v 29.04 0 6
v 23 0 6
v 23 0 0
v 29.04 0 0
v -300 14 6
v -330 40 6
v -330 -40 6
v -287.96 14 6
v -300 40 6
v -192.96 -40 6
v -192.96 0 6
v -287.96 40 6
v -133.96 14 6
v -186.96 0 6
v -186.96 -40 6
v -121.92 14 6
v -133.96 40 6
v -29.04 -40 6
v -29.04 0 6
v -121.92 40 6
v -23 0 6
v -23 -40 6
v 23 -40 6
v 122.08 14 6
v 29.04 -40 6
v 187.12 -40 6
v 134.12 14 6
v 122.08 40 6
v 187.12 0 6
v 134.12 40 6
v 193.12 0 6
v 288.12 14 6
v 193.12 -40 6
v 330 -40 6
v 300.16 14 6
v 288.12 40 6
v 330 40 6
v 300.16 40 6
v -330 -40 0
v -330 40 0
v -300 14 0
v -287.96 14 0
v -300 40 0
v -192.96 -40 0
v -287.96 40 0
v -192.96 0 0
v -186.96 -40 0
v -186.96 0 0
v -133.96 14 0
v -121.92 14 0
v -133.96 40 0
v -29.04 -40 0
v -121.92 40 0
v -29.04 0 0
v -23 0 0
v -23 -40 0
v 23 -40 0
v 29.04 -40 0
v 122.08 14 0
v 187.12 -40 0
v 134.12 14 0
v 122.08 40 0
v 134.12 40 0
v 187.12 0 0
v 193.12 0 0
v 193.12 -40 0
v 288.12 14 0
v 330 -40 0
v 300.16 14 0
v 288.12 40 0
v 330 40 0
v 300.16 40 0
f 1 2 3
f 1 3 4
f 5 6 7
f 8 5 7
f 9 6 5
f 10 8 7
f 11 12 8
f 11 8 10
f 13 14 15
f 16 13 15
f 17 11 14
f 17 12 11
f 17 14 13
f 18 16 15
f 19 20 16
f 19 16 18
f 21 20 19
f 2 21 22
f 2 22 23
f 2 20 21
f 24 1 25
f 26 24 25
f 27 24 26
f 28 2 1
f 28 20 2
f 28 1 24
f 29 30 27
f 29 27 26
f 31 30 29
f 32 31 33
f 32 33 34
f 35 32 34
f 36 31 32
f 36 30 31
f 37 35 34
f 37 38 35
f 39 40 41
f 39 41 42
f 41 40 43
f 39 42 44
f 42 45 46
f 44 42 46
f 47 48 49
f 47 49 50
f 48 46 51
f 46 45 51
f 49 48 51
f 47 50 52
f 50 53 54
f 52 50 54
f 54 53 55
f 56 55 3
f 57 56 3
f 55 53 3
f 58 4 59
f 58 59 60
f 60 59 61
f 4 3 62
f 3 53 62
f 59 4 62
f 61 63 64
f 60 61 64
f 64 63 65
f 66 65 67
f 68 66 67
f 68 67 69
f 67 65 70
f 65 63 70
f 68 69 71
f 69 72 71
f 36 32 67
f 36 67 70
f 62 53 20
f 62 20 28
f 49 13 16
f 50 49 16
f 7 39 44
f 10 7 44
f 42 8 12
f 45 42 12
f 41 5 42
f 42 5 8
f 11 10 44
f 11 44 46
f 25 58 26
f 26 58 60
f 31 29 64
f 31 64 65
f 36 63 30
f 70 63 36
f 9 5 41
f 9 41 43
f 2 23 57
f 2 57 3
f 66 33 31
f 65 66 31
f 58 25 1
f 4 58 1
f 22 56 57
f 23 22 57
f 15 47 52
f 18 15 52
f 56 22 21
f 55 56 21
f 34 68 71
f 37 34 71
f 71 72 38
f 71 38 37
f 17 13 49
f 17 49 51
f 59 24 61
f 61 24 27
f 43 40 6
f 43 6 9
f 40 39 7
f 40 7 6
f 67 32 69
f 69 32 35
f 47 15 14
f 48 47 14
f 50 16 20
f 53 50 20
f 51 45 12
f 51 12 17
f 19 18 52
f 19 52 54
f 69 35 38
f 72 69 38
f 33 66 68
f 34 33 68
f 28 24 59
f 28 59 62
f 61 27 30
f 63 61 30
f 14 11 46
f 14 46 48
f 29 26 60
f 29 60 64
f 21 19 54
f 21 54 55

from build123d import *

# Parameters (mm, degrees)
SKETCH1_W           = 660
SKETCH1_H           = 80
BOSS_EXTRUDE1_DEPTH = 6
SKETCH2_W           = 12.04
SKETCH2_H           = 26
CUT_EXTRUDE1_DEPTH  = 333.469547478
SKETCH3_W           = 6.04
SKETCH3_H           = 40
CUT_EXTRUDE2_DEPTH  = 333.469547478
CUT_EXTRUDE3_REACH  = 334.47
SKETCH4_W           = 6
SKETCH4_H           = 40


with BuildPart() as part:
    # Sketch1 → Boss-Extrude1 (new body)
    with BuildSketch(Plane.XY):
        Rectangle(SKETCH1_W, SKETCH1_H)
    extrude(amount=BOSS_EXTRUDE1_DEPTH)

    # Sketch2 → Cut-Extrude1 (cut, through all)
    with BuildSketch(Plane.XY.offset(6)):
        with Locations((-293.98, 27)):
            Rectangle(SKETCH2_W, SKETCH2_H)
        with Locations((-127.94, 27)):
            Rectangle(SKETCH2_W, SKETCH2_H)
        with Locations((128.1, 27)):
            Rectangle(SKETCH2_W, SKETCH2_H)
        with Locations((294.14, 27)):
            Rectangle(SKETCH2_W, SKETCH2_H)
    extrude(amount=-CUT_EXTRUDE1_DEPTH, mode=Mode.SUBTRACT)

    # Sketch3 → Cut-Extrude2 (cut, through all)
    with BuildSketch(Plane.XY.offset(6)):
        with Locations((-26.02, -20)):
            Rectangle(SKETCH3_W, SKETCH3_H)
        with Locations((26.02, -20)):
            Rectangle(SKETCH3_W, SKETCH3_H)
    extrude(amount=-CUT_EXTRUDE2_DEPTH, mode=Mode.SUBTRACT)

    # Sketch4 → Cut-Extrude3 (cut, up to next)
    with BuildSketch(Plane.XY.offset(6), mode=Mode.PRIVATE) as cut_extrude3_sk1:
        with Locations((-189.96, -20)):
            Rectangle(SKETCH4_W, SKETCH4_H)
    cut_extrude3_tool1 = extrude(cut_extrude3_sk1.sketch, amount=-CUT_EXTRUDE3_REACH, mode=Mode.PRIVATE) & part.part
    # Sketch4 → Cut-Extrude3 (cut, up to next)
    with BuildSketch(Plane.XY.offset(6), mode=Mode.PRIVATE) as cut_extrude3_sk2:
        with Locations((190.12, -20)):
            Rectangle(SKETCH4_W, SKETCH4_H)
    cut_extrude3_tool2 = extrude(cut_extrude3_sk2.sketch, amount=-CUT_EXTRUDE3_REACH, mode=Mode.PRIVATE) & part.part
    add(cut_extrude3_tool1.solids().sort_by_distance((-189.96, -20, 6))[0], mode=Mode.SUBTRACT)
    add(cut_extrude3_tool2.solids().sort_by_distance((190.12, -20, 6))[0], mode=Mode.SUBTRACT)


solid = part.part
